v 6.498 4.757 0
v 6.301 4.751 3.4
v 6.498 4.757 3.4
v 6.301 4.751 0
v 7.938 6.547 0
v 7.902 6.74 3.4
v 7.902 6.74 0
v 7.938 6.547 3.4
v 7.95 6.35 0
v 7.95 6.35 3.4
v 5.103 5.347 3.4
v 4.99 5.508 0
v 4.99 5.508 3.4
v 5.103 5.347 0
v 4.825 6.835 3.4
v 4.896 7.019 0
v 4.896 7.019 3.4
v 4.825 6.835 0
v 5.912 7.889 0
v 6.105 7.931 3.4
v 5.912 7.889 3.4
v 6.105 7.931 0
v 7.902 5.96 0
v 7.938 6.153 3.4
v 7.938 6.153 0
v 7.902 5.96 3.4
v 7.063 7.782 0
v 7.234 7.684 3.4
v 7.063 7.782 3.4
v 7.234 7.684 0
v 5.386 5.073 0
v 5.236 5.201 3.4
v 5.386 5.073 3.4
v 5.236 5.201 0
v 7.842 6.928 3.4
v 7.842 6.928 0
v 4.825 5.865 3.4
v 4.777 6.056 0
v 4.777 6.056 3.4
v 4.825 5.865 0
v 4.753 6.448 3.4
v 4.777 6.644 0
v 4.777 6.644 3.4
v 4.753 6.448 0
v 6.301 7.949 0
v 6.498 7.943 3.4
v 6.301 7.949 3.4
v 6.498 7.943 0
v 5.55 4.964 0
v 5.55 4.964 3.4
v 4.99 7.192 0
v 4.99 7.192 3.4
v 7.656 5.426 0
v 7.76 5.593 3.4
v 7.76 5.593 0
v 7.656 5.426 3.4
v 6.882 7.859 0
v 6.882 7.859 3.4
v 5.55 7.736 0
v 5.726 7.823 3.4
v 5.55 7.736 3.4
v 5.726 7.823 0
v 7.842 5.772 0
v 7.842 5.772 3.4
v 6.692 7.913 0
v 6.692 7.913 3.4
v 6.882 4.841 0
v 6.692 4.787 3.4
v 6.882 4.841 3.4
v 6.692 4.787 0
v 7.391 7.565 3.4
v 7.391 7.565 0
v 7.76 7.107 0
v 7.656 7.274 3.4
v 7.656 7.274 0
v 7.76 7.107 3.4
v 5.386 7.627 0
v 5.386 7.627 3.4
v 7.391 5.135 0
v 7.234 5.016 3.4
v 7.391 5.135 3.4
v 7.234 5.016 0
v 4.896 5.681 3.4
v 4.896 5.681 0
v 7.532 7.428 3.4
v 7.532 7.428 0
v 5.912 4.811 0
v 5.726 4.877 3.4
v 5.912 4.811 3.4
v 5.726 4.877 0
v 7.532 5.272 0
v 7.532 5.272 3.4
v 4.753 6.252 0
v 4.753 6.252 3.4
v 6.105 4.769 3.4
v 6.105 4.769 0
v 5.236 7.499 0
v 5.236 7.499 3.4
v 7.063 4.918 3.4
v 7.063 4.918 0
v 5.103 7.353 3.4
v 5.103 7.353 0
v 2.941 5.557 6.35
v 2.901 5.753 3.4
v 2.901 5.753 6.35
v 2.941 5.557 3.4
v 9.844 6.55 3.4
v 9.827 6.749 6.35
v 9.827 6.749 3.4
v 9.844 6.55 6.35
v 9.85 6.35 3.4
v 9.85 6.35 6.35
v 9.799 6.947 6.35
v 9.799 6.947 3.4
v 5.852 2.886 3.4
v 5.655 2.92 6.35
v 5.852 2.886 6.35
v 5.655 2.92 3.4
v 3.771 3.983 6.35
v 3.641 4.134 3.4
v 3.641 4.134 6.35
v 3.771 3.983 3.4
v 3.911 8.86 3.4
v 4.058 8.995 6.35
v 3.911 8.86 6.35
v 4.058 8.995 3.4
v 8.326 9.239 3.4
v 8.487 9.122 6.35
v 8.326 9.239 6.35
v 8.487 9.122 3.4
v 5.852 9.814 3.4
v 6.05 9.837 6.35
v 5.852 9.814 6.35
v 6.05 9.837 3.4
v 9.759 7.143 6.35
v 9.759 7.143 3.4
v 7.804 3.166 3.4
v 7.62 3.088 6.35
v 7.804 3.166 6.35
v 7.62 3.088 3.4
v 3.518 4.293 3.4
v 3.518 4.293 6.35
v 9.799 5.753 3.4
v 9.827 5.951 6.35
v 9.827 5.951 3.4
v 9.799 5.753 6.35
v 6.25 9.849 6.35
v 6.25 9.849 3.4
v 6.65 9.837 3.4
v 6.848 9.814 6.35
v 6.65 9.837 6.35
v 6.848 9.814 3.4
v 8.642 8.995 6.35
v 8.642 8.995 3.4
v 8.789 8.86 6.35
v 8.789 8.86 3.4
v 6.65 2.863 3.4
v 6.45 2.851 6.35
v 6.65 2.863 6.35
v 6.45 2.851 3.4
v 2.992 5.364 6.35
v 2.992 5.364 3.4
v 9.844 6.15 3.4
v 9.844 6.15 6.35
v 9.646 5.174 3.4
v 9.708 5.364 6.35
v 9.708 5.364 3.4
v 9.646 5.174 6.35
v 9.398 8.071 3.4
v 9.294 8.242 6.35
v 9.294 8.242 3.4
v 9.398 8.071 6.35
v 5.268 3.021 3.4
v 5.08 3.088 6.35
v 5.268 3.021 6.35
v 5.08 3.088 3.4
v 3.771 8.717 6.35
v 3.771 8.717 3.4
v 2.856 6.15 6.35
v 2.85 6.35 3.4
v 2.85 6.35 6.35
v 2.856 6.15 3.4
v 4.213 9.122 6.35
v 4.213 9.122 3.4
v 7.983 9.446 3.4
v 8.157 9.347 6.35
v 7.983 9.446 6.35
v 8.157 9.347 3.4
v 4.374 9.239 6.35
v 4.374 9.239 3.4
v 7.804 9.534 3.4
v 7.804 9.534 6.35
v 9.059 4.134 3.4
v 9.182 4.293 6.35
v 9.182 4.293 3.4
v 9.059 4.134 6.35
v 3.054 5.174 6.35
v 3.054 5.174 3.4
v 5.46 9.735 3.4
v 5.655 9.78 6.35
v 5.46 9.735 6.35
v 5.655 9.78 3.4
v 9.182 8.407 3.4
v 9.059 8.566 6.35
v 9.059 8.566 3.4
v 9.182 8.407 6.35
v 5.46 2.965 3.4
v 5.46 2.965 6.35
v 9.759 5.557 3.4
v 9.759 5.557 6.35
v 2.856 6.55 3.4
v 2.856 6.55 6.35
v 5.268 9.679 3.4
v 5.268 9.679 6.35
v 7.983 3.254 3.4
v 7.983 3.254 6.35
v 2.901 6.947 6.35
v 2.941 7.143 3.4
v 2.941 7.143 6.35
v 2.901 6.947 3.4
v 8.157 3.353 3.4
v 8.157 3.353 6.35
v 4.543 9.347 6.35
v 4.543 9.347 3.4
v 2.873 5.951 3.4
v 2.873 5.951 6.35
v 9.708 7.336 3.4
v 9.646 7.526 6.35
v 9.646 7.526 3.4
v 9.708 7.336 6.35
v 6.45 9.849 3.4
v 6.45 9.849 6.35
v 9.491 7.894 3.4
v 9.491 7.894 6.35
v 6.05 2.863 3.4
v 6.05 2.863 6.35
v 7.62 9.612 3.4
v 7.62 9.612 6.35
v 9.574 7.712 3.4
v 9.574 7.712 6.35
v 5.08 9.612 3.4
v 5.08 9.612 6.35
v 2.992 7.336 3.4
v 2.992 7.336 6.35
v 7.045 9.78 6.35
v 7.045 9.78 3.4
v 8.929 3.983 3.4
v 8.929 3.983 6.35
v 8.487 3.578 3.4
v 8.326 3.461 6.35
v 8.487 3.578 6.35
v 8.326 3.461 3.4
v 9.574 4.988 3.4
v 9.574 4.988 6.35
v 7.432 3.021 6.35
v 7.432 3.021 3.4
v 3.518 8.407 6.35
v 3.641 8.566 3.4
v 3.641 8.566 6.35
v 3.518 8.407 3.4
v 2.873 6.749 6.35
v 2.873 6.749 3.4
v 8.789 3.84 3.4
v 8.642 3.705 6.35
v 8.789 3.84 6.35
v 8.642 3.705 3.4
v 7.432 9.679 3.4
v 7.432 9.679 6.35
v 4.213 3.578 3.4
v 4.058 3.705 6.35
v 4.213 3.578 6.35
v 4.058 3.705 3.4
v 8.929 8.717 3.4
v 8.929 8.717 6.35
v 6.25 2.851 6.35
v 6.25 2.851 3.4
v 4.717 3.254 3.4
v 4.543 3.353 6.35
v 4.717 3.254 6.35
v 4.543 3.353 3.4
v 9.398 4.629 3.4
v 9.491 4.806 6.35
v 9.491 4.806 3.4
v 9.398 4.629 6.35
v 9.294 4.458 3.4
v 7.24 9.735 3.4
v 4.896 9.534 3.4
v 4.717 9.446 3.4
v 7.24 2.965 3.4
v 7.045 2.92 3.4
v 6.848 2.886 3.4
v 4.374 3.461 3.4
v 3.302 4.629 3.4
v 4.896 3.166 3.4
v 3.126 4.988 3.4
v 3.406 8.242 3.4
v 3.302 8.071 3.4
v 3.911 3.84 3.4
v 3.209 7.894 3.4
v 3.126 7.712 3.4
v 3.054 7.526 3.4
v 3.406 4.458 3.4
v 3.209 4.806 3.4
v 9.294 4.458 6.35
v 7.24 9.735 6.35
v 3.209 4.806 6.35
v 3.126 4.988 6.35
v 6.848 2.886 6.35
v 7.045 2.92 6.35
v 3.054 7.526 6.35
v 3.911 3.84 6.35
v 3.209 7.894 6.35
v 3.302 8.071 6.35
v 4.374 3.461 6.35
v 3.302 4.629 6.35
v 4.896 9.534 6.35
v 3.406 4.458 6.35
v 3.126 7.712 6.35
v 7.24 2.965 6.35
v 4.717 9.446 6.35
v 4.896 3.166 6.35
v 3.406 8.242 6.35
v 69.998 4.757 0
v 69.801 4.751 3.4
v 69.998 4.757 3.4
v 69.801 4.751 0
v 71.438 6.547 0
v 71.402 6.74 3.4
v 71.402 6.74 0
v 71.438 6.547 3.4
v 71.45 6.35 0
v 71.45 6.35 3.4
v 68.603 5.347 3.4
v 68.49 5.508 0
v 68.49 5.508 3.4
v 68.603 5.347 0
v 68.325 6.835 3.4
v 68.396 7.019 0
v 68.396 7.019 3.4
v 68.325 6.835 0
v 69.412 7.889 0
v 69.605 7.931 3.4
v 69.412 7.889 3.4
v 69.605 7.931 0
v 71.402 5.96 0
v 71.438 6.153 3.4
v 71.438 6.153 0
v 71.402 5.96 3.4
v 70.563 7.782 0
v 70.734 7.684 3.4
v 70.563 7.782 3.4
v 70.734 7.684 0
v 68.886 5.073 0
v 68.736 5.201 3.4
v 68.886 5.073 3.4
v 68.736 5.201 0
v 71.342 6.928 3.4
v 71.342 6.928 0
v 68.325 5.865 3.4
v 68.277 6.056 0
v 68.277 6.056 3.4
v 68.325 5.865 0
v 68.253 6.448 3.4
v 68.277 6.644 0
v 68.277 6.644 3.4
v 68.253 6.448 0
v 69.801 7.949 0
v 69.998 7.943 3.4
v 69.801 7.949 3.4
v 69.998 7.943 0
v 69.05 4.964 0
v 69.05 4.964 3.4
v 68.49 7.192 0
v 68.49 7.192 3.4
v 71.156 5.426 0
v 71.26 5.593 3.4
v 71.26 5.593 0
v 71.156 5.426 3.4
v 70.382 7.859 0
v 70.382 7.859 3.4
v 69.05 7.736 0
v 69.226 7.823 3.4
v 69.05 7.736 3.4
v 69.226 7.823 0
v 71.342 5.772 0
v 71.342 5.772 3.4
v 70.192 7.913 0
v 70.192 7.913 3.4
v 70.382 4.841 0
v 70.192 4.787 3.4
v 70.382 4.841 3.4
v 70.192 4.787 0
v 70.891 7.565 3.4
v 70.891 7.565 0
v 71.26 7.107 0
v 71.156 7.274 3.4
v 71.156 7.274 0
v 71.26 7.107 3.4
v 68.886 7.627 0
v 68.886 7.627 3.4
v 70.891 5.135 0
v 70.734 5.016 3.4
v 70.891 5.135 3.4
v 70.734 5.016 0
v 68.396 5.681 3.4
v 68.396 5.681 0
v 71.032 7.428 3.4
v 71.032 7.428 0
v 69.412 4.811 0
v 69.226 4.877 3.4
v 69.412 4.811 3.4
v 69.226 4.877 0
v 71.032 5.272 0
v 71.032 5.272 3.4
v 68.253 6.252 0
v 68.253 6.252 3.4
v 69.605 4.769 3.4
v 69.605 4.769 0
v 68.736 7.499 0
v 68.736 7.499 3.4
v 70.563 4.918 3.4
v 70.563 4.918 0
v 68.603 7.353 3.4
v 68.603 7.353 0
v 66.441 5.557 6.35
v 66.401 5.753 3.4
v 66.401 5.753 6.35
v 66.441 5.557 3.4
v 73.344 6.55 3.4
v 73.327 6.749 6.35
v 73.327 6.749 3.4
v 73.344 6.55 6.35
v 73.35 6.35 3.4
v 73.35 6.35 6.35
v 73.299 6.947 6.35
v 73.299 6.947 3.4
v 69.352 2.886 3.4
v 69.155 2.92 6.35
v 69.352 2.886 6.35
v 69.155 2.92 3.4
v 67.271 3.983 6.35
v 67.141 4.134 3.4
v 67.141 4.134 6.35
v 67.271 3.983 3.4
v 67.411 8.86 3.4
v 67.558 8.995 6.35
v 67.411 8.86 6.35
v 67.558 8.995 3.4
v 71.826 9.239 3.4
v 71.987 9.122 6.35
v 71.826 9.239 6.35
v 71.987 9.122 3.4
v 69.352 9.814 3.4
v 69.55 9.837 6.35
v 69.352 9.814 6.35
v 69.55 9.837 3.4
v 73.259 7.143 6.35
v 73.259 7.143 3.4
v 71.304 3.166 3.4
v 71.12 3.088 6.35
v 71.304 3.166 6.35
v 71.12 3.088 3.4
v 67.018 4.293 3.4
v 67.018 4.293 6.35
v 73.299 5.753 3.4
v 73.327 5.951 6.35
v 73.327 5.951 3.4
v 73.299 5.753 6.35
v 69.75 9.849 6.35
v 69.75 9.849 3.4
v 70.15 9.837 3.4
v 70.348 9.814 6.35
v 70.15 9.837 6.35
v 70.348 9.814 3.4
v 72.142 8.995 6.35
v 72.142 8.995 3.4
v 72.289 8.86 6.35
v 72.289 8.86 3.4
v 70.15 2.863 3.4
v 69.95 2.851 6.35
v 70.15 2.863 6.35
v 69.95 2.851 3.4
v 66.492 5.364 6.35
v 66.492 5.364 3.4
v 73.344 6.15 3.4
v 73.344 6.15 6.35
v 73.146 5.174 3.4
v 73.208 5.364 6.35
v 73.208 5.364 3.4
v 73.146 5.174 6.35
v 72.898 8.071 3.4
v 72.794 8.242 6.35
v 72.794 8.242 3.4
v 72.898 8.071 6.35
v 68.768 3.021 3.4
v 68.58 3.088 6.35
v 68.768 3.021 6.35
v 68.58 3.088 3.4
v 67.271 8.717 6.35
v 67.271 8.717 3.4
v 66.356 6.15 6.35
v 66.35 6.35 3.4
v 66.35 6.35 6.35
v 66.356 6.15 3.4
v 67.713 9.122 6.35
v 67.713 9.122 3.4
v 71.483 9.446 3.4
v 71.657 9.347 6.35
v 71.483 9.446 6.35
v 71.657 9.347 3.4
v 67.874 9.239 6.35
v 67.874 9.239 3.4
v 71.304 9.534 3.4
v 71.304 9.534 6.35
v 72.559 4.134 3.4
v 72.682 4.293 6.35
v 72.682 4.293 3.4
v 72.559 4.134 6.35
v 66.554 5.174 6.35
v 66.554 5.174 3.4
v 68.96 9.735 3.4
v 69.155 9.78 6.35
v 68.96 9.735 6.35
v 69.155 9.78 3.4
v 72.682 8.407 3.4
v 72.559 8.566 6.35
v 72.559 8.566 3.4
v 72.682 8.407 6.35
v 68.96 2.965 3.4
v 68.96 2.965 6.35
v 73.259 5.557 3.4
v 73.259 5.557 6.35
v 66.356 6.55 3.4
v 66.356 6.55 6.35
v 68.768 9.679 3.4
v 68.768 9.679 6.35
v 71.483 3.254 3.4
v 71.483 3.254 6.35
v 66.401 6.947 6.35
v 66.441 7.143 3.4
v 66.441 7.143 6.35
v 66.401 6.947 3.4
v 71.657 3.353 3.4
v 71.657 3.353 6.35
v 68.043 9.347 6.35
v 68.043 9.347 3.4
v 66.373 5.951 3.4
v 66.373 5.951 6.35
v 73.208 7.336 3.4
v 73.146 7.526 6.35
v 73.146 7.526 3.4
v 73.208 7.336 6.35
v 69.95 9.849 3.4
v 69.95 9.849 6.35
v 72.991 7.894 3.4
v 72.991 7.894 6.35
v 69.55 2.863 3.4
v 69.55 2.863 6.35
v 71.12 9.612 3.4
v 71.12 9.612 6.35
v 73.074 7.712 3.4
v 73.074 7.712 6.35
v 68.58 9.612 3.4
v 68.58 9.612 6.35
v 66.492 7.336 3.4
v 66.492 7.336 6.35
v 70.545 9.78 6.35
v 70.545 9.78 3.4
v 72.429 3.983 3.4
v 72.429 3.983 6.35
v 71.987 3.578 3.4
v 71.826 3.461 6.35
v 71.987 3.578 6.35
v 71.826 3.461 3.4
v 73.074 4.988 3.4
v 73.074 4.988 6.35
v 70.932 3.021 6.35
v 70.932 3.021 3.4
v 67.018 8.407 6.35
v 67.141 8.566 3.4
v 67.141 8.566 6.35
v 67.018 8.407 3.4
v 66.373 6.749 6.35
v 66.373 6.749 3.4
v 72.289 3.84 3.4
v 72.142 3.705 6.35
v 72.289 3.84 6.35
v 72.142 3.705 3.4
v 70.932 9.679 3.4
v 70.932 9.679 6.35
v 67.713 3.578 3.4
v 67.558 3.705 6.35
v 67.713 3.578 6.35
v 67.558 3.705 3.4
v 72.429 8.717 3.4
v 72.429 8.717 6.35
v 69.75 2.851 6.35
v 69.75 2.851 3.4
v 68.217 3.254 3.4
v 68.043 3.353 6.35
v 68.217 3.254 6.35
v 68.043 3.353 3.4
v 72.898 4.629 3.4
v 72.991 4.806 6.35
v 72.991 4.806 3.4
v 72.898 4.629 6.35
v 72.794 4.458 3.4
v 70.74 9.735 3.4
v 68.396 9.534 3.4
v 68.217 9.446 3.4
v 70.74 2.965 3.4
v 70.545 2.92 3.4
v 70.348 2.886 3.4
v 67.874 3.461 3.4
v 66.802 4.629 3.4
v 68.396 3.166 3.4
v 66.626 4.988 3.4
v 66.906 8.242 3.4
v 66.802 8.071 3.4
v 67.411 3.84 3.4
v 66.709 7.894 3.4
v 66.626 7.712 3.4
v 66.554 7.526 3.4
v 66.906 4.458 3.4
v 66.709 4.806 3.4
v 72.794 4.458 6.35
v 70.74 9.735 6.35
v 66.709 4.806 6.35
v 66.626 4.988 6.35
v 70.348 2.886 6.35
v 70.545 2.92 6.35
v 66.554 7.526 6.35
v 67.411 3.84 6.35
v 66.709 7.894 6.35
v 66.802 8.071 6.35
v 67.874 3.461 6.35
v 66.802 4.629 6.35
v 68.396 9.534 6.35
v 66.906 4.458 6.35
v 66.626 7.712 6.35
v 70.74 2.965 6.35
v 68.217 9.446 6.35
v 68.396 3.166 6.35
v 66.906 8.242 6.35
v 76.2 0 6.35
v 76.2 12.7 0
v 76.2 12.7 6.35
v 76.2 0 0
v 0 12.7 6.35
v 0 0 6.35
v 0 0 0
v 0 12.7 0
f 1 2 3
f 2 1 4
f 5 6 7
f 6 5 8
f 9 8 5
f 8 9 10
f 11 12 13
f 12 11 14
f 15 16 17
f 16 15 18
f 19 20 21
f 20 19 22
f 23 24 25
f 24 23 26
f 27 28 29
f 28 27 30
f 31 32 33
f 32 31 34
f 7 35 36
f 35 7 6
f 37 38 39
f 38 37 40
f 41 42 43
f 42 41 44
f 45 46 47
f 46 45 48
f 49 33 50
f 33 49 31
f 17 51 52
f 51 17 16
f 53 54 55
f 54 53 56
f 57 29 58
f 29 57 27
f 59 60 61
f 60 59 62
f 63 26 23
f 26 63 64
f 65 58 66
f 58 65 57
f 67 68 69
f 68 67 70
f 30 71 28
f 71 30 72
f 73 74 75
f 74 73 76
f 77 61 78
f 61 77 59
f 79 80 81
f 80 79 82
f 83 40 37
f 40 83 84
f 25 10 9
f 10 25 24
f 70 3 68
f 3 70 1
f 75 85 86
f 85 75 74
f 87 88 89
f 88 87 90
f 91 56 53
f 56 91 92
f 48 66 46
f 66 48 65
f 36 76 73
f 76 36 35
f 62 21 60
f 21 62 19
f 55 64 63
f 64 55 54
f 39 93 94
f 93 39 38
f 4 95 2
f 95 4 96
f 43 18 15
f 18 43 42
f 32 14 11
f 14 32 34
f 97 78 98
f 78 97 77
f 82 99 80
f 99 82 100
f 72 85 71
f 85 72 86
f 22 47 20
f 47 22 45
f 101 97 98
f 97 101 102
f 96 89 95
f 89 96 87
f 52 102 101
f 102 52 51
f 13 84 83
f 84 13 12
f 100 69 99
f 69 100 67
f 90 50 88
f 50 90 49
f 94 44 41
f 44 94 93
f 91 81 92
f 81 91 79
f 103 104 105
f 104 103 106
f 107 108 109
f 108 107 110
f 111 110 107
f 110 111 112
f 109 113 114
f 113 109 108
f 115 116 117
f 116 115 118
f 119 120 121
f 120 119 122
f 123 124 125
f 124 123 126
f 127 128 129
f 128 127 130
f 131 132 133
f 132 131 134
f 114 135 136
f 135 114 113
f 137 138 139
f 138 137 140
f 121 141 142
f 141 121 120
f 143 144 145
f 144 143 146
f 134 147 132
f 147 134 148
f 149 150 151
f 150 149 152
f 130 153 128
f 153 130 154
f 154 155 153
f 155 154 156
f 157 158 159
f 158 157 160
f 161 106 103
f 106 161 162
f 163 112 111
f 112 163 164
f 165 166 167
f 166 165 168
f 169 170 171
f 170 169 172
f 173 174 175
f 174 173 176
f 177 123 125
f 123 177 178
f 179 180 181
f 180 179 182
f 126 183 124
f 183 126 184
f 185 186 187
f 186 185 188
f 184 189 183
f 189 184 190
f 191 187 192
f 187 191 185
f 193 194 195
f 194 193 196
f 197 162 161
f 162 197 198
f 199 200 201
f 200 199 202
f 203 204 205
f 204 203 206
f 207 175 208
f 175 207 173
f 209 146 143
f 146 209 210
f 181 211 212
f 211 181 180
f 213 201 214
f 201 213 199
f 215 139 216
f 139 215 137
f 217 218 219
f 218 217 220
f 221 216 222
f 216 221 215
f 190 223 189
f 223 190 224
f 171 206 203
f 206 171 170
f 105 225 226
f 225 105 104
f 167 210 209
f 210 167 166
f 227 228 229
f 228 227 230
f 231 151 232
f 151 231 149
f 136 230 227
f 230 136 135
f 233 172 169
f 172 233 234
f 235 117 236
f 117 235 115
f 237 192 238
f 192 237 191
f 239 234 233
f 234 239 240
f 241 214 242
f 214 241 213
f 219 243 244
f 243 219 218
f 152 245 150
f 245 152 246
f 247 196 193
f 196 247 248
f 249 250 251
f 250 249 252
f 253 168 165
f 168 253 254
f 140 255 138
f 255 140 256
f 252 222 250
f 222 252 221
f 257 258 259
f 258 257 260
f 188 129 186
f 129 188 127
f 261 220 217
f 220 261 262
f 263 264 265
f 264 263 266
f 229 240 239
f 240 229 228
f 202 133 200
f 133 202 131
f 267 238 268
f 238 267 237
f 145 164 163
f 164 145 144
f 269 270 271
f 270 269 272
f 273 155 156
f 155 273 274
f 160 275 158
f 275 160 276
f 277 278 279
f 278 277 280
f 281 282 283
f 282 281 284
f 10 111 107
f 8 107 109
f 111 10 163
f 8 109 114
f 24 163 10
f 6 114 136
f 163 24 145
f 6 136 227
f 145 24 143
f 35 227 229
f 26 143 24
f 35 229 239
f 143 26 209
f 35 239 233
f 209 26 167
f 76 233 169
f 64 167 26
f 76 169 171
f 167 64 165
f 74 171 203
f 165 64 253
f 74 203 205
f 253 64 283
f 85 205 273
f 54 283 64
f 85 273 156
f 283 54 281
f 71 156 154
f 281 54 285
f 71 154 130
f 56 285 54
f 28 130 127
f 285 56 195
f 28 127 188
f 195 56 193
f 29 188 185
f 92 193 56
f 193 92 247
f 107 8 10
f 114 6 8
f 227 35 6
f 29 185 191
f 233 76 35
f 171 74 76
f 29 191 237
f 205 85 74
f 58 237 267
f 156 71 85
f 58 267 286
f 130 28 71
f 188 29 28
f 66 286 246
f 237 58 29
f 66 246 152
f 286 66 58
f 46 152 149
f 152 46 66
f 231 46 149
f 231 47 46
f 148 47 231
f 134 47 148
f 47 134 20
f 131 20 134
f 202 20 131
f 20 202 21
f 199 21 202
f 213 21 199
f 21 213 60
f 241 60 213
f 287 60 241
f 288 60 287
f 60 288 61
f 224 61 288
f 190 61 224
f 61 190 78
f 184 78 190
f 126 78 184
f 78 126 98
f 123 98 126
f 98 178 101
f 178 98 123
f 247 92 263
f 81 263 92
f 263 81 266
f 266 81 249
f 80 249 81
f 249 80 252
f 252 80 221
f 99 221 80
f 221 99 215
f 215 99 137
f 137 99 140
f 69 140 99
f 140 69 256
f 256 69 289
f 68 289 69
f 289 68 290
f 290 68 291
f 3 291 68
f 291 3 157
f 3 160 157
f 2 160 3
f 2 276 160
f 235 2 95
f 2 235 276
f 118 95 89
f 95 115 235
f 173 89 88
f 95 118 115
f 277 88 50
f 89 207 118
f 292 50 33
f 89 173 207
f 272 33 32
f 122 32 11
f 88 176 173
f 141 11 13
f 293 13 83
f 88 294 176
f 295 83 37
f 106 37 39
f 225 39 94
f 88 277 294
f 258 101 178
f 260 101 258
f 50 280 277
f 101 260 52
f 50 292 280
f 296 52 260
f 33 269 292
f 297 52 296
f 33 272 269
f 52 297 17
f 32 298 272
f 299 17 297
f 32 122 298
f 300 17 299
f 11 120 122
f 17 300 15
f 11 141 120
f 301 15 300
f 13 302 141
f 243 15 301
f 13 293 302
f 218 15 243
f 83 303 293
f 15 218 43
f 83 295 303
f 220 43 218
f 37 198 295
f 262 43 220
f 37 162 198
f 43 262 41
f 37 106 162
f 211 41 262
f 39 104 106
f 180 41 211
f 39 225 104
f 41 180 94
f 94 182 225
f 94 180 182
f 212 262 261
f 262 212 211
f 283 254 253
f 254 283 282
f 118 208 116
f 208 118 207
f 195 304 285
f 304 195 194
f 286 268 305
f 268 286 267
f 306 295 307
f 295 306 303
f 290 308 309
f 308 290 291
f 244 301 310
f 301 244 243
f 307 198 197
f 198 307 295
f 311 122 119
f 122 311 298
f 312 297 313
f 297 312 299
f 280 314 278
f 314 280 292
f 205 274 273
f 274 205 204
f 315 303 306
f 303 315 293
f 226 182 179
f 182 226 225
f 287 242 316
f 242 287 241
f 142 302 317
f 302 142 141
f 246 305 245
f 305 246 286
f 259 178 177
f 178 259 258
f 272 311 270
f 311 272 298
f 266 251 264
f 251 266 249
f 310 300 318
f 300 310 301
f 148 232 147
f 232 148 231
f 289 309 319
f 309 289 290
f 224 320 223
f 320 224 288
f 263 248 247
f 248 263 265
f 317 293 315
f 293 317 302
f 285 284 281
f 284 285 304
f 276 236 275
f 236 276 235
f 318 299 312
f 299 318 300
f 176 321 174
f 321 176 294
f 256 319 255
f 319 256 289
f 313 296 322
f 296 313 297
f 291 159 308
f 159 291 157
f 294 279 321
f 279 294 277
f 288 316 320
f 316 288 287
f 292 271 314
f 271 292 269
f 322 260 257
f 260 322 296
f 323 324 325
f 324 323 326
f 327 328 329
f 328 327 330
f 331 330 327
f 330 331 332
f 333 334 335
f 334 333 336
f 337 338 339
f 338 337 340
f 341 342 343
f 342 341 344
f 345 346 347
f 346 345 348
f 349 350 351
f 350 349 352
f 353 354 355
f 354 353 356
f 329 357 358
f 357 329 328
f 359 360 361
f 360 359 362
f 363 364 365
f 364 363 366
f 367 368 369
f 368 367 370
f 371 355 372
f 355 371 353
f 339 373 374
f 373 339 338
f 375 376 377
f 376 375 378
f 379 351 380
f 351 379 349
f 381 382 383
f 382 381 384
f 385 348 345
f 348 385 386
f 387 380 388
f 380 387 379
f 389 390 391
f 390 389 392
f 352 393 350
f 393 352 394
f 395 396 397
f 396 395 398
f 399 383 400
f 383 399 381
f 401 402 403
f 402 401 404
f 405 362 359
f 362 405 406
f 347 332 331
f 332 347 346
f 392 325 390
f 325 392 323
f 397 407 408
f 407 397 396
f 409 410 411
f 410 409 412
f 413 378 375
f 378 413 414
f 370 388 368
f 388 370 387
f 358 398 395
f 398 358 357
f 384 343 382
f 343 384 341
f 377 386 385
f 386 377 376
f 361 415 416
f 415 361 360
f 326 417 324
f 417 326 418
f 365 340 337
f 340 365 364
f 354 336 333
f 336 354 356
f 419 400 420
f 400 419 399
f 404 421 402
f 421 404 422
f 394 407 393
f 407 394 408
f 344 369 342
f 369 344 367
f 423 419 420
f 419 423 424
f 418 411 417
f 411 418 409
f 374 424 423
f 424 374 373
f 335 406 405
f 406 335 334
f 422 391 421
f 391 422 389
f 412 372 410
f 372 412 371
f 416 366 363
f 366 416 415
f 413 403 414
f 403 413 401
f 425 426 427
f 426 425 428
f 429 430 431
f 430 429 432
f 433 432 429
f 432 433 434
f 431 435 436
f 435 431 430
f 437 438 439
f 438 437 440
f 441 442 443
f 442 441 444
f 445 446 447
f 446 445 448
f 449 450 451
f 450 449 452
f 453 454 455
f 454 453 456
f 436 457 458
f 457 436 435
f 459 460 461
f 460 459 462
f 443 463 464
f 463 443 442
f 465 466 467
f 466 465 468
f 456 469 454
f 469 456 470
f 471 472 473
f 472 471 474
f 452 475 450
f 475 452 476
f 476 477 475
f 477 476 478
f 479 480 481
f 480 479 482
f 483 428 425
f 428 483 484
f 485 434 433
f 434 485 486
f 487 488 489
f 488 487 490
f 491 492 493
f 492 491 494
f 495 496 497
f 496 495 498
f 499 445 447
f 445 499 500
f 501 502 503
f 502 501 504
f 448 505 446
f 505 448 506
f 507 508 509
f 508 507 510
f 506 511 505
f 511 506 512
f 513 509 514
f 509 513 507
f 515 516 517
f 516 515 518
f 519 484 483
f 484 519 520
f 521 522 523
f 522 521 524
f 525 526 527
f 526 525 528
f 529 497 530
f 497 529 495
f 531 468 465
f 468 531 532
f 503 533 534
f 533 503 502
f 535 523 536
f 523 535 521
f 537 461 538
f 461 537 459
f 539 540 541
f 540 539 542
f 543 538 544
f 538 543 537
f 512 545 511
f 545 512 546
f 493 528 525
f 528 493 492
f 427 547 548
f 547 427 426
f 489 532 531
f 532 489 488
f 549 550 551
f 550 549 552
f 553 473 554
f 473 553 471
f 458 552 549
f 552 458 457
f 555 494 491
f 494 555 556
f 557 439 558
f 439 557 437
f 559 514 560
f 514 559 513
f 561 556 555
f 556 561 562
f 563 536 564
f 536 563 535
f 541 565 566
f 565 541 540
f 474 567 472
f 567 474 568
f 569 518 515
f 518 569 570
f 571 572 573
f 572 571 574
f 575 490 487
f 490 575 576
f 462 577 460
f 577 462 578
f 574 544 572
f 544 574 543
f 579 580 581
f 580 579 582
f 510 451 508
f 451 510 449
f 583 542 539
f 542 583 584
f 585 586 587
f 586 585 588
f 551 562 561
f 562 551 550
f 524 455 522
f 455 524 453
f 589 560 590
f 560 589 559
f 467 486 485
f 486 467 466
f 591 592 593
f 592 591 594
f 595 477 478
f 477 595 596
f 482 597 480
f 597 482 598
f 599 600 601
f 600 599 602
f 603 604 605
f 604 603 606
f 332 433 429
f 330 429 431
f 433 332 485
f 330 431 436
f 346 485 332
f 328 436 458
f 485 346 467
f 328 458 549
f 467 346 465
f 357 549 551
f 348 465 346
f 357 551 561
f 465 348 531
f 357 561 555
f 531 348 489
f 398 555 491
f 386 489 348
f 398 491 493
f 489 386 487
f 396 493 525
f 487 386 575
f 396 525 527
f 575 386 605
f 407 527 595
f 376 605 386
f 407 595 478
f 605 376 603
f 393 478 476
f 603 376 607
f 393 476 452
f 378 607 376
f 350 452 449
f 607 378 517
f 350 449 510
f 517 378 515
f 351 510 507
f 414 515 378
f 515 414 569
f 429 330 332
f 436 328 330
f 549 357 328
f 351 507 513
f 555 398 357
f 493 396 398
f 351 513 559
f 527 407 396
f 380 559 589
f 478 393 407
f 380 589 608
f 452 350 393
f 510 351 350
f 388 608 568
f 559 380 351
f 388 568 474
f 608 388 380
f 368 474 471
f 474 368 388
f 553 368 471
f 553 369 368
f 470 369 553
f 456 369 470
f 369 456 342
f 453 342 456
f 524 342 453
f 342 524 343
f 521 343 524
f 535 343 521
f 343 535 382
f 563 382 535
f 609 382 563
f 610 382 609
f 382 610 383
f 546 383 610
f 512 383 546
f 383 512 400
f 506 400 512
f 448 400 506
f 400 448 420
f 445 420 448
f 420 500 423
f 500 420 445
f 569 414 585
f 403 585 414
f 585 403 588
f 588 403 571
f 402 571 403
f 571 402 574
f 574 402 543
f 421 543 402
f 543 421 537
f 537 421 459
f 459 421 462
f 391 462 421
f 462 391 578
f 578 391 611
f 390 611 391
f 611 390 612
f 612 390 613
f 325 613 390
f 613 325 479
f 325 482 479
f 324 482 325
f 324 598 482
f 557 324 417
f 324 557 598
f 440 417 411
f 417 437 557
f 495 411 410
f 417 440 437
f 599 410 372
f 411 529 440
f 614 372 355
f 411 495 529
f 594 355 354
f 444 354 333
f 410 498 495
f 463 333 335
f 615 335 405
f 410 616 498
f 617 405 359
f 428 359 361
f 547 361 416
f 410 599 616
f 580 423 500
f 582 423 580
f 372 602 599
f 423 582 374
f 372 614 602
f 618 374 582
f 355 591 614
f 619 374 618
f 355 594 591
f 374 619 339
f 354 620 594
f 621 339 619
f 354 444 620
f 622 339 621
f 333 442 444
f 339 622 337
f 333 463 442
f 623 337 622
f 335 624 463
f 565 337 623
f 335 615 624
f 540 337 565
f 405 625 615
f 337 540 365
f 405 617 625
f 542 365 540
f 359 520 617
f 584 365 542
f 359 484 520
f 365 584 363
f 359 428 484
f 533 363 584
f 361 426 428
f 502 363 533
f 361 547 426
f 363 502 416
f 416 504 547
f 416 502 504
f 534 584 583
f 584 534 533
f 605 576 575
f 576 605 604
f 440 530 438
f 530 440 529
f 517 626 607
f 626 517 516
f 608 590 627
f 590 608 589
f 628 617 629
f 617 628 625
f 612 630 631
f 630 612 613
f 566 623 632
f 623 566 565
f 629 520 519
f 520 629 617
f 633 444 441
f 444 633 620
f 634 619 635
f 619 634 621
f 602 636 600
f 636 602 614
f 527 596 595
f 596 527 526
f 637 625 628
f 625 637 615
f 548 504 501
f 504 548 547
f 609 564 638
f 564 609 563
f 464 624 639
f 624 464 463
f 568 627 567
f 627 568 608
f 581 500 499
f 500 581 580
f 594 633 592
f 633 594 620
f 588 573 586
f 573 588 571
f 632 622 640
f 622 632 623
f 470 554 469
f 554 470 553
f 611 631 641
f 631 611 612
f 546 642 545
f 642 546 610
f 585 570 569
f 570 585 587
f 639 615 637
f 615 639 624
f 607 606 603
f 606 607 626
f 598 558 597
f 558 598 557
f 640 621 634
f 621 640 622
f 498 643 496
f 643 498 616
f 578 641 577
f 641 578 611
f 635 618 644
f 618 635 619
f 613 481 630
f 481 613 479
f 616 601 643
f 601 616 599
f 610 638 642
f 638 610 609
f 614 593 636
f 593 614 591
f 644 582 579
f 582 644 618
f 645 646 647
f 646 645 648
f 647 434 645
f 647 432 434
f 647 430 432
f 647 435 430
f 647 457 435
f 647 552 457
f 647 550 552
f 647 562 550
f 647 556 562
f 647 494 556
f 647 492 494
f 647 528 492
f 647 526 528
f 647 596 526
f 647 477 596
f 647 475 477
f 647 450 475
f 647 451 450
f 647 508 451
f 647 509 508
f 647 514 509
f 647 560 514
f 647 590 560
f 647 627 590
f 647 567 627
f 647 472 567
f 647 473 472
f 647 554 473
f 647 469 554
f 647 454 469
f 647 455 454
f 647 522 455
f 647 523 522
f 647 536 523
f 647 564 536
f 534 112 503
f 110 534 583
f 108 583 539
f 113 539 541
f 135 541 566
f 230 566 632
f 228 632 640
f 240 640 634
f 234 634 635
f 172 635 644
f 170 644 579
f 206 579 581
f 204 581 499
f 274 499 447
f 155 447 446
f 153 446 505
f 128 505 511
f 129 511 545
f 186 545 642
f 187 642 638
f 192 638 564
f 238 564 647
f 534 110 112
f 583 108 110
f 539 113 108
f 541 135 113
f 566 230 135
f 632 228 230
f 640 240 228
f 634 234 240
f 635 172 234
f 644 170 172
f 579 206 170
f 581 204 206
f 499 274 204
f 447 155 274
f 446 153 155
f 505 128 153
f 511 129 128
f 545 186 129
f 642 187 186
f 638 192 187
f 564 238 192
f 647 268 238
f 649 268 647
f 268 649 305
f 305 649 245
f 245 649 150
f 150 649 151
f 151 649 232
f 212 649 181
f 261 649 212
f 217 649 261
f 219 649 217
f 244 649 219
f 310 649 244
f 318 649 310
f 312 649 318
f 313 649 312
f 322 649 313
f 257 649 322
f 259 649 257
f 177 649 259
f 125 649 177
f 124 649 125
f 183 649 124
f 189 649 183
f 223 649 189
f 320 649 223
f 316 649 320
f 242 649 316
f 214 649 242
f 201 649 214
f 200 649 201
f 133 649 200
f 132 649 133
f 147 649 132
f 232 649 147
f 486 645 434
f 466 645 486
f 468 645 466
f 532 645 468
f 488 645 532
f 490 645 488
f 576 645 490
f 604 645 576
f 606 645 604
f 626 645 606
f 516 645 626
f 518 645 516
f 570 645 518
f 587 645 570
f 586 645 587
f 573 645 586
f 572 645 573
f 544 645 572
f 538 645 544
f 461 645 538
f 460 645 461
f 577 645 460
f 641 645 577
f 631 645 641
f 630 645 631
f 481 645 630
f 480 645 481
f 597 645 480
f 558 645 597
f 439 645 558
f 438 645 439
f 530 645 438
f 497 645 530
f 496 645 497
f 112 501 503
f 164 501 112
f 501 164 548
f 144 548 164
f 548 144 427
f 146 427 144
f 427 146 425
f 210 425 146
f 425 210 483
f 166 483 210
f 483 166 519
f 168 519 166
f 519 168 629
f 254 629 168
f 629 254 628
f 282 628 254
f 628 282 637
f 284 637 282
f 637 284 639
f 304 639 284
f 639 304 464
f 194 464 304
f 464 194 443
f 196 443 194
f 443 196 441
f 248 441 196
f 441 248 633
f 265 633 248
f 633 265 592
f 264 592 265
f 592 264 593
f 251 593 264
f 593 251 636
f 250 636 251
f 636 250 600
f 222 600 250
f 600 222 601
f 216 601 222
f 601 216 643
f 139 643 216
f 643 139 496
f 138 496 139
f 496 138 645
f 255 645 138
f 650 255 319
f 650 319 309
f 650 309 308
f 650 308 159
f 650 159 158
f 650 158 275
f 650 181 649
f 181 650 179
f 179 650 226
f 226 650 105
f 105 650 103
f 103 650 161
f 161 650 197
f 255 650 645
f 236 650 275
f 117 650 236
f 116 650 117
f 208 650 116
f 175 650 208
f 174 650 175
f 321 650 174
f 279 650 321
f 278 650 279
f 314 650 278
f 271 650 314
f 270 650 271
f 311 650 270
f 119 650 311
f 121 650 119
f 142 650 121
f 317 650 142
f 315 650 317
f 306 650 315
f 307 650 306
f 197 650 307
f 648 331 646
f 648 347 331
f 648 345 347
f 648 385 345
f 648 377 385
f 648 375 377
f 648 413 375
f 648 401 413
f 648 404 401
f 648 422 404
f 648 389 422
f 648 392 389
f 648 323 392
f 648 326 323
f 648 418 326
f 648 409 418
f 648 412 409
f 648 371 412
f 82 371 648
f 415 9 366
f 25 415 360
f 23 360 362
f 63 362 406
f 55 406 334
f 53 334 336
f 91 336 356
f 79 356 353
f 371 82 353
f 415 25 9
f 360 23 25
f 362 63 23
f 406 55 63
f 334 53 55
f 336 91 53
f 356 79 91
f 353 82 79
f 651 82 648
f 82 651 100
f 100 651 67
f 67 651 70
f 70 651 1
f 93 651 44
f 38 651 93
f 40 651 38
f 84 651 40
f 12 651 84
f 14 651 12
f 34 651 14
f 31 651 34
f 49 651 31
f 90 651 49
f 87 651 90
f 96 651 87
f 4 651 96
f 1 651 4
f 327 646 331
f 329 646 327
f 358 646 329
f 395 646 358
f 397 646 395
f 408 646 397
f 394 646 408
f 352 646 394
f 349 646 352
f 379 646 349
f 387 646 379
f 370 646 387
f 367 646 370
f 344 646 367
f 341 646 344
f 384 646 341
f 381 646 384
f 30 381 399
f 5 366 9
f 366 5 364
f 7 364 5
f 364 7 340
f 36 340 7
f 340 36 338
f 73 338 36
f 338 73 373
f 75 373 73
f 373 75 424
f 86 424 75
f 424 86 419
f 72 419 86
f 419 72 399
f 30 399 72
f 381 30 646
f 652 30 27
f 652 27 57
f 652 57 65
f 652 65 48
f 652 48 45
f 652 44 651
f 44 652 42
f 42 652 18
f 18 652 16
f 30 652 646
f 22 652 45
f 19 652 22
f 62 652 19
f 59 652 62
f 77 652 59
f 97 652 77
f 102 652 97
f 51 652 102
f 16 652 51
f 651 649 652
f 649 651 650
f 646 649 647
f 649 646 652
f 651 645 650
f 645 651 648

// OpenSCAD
// ***** PARAMETERS / INPUTS *****

  // external dimensions of jaws
    jaw_length = in_to_mm(3);
    jaw_width = in_to_mm(.5);
    jaw_height = in_to_mm(.25);

  // M3 screw clearance = 3.2mm = .13"
    counterbore_thru_dia = 3.2; 
  // M3 pan head clearance = 7mm = .28"
    counterbore_bore_dia = 7;
  // sets bore depth to 3.4mm or .13" from bottom of jaw
    counterbore_bore_depth = jaw_height - 3.4;

  // set to true to add rectangular step to one side
    add_jaw_step = false;
    jaw_step_height = in_to_mm(.1);
    jaw_step_depth = in_to_mm(.03);

  // set to true to add a HORIZONTAL v-groove to one side
    add_v_groove = false; 
    v_groove_height = in_to_mm(.1);
    v_groove_top_offset = in_to_mm(.025);

  // set to true to add a VERTICAL v to the jaw
    add_vertical_v = false; 
    vertical_v_width = in_to_mm(.3);
  // error if v_depth set equal to jaw height
    vertical_v_depth = in_to_mm(.3); 

  // set to true to add a vertical slot pattern to side1
    add_vertical_slots = false;  
  // set to true to add a vertical slot pattern to side2
    mirror_vertical_slots = false; 
    vertical_slot_pattern_width = in_to_mm(1);
    vertical_slot_pattern_qty = 5;
    vertical_slot_width = in_to_mm(.08);
    vertical_slot_length = in_to_mm(.15);
  // error if slot_depth set equal to jaw height
    vertical_slot_depth = in_to_mm(.2); 
    slot_spacing = vertical_slot_pattern_width/(vertical_slot_pattern_qty-1);
    slot_offset = (jaw_length-vertical_slot_pattern_width-vertical_slot_width)/2;


// ***** SET STL RESOLUTION *****

  // default minimum facet angle degrees
    $fa=0.5;
  // default minimum facet size mm
    $fs=0.2; 


// ***** CREATE GEOMETRY *****

difference()
{
	// main body of the jaw plate
    cube([jaw_length,jaw_width,jaw_height]);

	// counterbores
    translate([jaw_length/2-in_to_mm(1.25), jaw_width/2,0])
      counterbore(counterbore_thru_dia, counterbore_bore_dia, counterbore_bore_depth);
      
    translate([jaw_length/2+in_to_mm(1.25), jaw_width/2,0]) 
      counterbore(counterbore_thru_dia, counterbore_bore_dia, counterbore_bore_depth);
	
	// jaw step
    if(add_jaw_step) 
    {
      jaw_step(jaw_step_height,jaw_step_depth);
    }
	
	// horizontal v-groove
    if(add_v_groove)
    {
      v_groove(v_groove_height, v_groove_top_offset);
    }
    
    if(add_vertical_v)
    {
      color("red") vertical_v(vertical_v_width, vertical_v_depth);
    }
	
	// vertical slots
    if(add_vertical_slots)
    {
      for(i = [0 : vertical_slot_pattern_qty-1])
      {
        vertical_slot(slot_offset+i*slot_spacing,vertical_slot_width,vertical_slot_length,vertical_slot_depth);
      }
    }	
    if(mirror_vertical_slots)
    {
      for(i = [0 : vertical_slot_pattern_qty-1])
      {
        translate([0,-jaw_width-1+vertical_slot_length]) 
          vertical_slot(slot_offset+i*slot_spacing,vertical_slot_width,vertical_slot_length,vertical_slot_depth);
      }
    }
}	


// ***** MODULES AND FUNCTIONS *****

  // creates a counterbore body (must be subtracted from main body)
    module counterbore(thru_dia, bore_dia, bore_depth) 
    {
      union() 
      {
        // thru hole cylinder
        translate([0,0,-1]) 
          cylinder(h=jaw_height+2,d=thru_dia);
        // counterbore cylinder
        translate([0,0,jaw_height-bore_depth]) 
          cylinder(h=bore_depth+1, d=bore_dia);
      }
    }

  // creates a step body (must be subtracted from main body)
    module jaw_step(s_height, s_depth) 
    {
      translate([-1,-1,jaw_height-s_height]) 
        cube([jaw_length+2, s_depth+1, s_height+1]);
    }

  // creates a 90 degree v-groove body (must be subtracted from main body)
    module v_groove(v_height, v_top_offset)
    {
      v_leg = sqrt(pow(v_height,2)/2);
      translate([-1,jaw_width+sqrt(1/2),jaw_height-v_height-v_top_offset-sqrt(1/2)]) 
        rotate([45,0,0]) 
          cube([jaw_length+2, v_leg+1, v_leg+1]);
    }

    module vertical_v(vv_width, vv_depth)
    {
      vv_leg = sqrt((1/2)*pow(vv_width,2));
      translate([jaw_length/2, (-1/2)*vv_width, jaw_height-vv_depth])
        rotate([0,0,45])
          cube([vv_leg, vv_leg, vv_depth+1]);
    }

    module vertical_slot(slot_side_offset, slot_width, slot_length, slot_depth)
    {
      translate([slot_side_offset, jaw_width-slot_length, jaw_height-slot_depth]) 
        cube([slot_width, slot_length+1, slot_depth+1]);
    }

  // inch to millimeter conversion function
    function in_to_mm(inches) = inches * 25.4;
